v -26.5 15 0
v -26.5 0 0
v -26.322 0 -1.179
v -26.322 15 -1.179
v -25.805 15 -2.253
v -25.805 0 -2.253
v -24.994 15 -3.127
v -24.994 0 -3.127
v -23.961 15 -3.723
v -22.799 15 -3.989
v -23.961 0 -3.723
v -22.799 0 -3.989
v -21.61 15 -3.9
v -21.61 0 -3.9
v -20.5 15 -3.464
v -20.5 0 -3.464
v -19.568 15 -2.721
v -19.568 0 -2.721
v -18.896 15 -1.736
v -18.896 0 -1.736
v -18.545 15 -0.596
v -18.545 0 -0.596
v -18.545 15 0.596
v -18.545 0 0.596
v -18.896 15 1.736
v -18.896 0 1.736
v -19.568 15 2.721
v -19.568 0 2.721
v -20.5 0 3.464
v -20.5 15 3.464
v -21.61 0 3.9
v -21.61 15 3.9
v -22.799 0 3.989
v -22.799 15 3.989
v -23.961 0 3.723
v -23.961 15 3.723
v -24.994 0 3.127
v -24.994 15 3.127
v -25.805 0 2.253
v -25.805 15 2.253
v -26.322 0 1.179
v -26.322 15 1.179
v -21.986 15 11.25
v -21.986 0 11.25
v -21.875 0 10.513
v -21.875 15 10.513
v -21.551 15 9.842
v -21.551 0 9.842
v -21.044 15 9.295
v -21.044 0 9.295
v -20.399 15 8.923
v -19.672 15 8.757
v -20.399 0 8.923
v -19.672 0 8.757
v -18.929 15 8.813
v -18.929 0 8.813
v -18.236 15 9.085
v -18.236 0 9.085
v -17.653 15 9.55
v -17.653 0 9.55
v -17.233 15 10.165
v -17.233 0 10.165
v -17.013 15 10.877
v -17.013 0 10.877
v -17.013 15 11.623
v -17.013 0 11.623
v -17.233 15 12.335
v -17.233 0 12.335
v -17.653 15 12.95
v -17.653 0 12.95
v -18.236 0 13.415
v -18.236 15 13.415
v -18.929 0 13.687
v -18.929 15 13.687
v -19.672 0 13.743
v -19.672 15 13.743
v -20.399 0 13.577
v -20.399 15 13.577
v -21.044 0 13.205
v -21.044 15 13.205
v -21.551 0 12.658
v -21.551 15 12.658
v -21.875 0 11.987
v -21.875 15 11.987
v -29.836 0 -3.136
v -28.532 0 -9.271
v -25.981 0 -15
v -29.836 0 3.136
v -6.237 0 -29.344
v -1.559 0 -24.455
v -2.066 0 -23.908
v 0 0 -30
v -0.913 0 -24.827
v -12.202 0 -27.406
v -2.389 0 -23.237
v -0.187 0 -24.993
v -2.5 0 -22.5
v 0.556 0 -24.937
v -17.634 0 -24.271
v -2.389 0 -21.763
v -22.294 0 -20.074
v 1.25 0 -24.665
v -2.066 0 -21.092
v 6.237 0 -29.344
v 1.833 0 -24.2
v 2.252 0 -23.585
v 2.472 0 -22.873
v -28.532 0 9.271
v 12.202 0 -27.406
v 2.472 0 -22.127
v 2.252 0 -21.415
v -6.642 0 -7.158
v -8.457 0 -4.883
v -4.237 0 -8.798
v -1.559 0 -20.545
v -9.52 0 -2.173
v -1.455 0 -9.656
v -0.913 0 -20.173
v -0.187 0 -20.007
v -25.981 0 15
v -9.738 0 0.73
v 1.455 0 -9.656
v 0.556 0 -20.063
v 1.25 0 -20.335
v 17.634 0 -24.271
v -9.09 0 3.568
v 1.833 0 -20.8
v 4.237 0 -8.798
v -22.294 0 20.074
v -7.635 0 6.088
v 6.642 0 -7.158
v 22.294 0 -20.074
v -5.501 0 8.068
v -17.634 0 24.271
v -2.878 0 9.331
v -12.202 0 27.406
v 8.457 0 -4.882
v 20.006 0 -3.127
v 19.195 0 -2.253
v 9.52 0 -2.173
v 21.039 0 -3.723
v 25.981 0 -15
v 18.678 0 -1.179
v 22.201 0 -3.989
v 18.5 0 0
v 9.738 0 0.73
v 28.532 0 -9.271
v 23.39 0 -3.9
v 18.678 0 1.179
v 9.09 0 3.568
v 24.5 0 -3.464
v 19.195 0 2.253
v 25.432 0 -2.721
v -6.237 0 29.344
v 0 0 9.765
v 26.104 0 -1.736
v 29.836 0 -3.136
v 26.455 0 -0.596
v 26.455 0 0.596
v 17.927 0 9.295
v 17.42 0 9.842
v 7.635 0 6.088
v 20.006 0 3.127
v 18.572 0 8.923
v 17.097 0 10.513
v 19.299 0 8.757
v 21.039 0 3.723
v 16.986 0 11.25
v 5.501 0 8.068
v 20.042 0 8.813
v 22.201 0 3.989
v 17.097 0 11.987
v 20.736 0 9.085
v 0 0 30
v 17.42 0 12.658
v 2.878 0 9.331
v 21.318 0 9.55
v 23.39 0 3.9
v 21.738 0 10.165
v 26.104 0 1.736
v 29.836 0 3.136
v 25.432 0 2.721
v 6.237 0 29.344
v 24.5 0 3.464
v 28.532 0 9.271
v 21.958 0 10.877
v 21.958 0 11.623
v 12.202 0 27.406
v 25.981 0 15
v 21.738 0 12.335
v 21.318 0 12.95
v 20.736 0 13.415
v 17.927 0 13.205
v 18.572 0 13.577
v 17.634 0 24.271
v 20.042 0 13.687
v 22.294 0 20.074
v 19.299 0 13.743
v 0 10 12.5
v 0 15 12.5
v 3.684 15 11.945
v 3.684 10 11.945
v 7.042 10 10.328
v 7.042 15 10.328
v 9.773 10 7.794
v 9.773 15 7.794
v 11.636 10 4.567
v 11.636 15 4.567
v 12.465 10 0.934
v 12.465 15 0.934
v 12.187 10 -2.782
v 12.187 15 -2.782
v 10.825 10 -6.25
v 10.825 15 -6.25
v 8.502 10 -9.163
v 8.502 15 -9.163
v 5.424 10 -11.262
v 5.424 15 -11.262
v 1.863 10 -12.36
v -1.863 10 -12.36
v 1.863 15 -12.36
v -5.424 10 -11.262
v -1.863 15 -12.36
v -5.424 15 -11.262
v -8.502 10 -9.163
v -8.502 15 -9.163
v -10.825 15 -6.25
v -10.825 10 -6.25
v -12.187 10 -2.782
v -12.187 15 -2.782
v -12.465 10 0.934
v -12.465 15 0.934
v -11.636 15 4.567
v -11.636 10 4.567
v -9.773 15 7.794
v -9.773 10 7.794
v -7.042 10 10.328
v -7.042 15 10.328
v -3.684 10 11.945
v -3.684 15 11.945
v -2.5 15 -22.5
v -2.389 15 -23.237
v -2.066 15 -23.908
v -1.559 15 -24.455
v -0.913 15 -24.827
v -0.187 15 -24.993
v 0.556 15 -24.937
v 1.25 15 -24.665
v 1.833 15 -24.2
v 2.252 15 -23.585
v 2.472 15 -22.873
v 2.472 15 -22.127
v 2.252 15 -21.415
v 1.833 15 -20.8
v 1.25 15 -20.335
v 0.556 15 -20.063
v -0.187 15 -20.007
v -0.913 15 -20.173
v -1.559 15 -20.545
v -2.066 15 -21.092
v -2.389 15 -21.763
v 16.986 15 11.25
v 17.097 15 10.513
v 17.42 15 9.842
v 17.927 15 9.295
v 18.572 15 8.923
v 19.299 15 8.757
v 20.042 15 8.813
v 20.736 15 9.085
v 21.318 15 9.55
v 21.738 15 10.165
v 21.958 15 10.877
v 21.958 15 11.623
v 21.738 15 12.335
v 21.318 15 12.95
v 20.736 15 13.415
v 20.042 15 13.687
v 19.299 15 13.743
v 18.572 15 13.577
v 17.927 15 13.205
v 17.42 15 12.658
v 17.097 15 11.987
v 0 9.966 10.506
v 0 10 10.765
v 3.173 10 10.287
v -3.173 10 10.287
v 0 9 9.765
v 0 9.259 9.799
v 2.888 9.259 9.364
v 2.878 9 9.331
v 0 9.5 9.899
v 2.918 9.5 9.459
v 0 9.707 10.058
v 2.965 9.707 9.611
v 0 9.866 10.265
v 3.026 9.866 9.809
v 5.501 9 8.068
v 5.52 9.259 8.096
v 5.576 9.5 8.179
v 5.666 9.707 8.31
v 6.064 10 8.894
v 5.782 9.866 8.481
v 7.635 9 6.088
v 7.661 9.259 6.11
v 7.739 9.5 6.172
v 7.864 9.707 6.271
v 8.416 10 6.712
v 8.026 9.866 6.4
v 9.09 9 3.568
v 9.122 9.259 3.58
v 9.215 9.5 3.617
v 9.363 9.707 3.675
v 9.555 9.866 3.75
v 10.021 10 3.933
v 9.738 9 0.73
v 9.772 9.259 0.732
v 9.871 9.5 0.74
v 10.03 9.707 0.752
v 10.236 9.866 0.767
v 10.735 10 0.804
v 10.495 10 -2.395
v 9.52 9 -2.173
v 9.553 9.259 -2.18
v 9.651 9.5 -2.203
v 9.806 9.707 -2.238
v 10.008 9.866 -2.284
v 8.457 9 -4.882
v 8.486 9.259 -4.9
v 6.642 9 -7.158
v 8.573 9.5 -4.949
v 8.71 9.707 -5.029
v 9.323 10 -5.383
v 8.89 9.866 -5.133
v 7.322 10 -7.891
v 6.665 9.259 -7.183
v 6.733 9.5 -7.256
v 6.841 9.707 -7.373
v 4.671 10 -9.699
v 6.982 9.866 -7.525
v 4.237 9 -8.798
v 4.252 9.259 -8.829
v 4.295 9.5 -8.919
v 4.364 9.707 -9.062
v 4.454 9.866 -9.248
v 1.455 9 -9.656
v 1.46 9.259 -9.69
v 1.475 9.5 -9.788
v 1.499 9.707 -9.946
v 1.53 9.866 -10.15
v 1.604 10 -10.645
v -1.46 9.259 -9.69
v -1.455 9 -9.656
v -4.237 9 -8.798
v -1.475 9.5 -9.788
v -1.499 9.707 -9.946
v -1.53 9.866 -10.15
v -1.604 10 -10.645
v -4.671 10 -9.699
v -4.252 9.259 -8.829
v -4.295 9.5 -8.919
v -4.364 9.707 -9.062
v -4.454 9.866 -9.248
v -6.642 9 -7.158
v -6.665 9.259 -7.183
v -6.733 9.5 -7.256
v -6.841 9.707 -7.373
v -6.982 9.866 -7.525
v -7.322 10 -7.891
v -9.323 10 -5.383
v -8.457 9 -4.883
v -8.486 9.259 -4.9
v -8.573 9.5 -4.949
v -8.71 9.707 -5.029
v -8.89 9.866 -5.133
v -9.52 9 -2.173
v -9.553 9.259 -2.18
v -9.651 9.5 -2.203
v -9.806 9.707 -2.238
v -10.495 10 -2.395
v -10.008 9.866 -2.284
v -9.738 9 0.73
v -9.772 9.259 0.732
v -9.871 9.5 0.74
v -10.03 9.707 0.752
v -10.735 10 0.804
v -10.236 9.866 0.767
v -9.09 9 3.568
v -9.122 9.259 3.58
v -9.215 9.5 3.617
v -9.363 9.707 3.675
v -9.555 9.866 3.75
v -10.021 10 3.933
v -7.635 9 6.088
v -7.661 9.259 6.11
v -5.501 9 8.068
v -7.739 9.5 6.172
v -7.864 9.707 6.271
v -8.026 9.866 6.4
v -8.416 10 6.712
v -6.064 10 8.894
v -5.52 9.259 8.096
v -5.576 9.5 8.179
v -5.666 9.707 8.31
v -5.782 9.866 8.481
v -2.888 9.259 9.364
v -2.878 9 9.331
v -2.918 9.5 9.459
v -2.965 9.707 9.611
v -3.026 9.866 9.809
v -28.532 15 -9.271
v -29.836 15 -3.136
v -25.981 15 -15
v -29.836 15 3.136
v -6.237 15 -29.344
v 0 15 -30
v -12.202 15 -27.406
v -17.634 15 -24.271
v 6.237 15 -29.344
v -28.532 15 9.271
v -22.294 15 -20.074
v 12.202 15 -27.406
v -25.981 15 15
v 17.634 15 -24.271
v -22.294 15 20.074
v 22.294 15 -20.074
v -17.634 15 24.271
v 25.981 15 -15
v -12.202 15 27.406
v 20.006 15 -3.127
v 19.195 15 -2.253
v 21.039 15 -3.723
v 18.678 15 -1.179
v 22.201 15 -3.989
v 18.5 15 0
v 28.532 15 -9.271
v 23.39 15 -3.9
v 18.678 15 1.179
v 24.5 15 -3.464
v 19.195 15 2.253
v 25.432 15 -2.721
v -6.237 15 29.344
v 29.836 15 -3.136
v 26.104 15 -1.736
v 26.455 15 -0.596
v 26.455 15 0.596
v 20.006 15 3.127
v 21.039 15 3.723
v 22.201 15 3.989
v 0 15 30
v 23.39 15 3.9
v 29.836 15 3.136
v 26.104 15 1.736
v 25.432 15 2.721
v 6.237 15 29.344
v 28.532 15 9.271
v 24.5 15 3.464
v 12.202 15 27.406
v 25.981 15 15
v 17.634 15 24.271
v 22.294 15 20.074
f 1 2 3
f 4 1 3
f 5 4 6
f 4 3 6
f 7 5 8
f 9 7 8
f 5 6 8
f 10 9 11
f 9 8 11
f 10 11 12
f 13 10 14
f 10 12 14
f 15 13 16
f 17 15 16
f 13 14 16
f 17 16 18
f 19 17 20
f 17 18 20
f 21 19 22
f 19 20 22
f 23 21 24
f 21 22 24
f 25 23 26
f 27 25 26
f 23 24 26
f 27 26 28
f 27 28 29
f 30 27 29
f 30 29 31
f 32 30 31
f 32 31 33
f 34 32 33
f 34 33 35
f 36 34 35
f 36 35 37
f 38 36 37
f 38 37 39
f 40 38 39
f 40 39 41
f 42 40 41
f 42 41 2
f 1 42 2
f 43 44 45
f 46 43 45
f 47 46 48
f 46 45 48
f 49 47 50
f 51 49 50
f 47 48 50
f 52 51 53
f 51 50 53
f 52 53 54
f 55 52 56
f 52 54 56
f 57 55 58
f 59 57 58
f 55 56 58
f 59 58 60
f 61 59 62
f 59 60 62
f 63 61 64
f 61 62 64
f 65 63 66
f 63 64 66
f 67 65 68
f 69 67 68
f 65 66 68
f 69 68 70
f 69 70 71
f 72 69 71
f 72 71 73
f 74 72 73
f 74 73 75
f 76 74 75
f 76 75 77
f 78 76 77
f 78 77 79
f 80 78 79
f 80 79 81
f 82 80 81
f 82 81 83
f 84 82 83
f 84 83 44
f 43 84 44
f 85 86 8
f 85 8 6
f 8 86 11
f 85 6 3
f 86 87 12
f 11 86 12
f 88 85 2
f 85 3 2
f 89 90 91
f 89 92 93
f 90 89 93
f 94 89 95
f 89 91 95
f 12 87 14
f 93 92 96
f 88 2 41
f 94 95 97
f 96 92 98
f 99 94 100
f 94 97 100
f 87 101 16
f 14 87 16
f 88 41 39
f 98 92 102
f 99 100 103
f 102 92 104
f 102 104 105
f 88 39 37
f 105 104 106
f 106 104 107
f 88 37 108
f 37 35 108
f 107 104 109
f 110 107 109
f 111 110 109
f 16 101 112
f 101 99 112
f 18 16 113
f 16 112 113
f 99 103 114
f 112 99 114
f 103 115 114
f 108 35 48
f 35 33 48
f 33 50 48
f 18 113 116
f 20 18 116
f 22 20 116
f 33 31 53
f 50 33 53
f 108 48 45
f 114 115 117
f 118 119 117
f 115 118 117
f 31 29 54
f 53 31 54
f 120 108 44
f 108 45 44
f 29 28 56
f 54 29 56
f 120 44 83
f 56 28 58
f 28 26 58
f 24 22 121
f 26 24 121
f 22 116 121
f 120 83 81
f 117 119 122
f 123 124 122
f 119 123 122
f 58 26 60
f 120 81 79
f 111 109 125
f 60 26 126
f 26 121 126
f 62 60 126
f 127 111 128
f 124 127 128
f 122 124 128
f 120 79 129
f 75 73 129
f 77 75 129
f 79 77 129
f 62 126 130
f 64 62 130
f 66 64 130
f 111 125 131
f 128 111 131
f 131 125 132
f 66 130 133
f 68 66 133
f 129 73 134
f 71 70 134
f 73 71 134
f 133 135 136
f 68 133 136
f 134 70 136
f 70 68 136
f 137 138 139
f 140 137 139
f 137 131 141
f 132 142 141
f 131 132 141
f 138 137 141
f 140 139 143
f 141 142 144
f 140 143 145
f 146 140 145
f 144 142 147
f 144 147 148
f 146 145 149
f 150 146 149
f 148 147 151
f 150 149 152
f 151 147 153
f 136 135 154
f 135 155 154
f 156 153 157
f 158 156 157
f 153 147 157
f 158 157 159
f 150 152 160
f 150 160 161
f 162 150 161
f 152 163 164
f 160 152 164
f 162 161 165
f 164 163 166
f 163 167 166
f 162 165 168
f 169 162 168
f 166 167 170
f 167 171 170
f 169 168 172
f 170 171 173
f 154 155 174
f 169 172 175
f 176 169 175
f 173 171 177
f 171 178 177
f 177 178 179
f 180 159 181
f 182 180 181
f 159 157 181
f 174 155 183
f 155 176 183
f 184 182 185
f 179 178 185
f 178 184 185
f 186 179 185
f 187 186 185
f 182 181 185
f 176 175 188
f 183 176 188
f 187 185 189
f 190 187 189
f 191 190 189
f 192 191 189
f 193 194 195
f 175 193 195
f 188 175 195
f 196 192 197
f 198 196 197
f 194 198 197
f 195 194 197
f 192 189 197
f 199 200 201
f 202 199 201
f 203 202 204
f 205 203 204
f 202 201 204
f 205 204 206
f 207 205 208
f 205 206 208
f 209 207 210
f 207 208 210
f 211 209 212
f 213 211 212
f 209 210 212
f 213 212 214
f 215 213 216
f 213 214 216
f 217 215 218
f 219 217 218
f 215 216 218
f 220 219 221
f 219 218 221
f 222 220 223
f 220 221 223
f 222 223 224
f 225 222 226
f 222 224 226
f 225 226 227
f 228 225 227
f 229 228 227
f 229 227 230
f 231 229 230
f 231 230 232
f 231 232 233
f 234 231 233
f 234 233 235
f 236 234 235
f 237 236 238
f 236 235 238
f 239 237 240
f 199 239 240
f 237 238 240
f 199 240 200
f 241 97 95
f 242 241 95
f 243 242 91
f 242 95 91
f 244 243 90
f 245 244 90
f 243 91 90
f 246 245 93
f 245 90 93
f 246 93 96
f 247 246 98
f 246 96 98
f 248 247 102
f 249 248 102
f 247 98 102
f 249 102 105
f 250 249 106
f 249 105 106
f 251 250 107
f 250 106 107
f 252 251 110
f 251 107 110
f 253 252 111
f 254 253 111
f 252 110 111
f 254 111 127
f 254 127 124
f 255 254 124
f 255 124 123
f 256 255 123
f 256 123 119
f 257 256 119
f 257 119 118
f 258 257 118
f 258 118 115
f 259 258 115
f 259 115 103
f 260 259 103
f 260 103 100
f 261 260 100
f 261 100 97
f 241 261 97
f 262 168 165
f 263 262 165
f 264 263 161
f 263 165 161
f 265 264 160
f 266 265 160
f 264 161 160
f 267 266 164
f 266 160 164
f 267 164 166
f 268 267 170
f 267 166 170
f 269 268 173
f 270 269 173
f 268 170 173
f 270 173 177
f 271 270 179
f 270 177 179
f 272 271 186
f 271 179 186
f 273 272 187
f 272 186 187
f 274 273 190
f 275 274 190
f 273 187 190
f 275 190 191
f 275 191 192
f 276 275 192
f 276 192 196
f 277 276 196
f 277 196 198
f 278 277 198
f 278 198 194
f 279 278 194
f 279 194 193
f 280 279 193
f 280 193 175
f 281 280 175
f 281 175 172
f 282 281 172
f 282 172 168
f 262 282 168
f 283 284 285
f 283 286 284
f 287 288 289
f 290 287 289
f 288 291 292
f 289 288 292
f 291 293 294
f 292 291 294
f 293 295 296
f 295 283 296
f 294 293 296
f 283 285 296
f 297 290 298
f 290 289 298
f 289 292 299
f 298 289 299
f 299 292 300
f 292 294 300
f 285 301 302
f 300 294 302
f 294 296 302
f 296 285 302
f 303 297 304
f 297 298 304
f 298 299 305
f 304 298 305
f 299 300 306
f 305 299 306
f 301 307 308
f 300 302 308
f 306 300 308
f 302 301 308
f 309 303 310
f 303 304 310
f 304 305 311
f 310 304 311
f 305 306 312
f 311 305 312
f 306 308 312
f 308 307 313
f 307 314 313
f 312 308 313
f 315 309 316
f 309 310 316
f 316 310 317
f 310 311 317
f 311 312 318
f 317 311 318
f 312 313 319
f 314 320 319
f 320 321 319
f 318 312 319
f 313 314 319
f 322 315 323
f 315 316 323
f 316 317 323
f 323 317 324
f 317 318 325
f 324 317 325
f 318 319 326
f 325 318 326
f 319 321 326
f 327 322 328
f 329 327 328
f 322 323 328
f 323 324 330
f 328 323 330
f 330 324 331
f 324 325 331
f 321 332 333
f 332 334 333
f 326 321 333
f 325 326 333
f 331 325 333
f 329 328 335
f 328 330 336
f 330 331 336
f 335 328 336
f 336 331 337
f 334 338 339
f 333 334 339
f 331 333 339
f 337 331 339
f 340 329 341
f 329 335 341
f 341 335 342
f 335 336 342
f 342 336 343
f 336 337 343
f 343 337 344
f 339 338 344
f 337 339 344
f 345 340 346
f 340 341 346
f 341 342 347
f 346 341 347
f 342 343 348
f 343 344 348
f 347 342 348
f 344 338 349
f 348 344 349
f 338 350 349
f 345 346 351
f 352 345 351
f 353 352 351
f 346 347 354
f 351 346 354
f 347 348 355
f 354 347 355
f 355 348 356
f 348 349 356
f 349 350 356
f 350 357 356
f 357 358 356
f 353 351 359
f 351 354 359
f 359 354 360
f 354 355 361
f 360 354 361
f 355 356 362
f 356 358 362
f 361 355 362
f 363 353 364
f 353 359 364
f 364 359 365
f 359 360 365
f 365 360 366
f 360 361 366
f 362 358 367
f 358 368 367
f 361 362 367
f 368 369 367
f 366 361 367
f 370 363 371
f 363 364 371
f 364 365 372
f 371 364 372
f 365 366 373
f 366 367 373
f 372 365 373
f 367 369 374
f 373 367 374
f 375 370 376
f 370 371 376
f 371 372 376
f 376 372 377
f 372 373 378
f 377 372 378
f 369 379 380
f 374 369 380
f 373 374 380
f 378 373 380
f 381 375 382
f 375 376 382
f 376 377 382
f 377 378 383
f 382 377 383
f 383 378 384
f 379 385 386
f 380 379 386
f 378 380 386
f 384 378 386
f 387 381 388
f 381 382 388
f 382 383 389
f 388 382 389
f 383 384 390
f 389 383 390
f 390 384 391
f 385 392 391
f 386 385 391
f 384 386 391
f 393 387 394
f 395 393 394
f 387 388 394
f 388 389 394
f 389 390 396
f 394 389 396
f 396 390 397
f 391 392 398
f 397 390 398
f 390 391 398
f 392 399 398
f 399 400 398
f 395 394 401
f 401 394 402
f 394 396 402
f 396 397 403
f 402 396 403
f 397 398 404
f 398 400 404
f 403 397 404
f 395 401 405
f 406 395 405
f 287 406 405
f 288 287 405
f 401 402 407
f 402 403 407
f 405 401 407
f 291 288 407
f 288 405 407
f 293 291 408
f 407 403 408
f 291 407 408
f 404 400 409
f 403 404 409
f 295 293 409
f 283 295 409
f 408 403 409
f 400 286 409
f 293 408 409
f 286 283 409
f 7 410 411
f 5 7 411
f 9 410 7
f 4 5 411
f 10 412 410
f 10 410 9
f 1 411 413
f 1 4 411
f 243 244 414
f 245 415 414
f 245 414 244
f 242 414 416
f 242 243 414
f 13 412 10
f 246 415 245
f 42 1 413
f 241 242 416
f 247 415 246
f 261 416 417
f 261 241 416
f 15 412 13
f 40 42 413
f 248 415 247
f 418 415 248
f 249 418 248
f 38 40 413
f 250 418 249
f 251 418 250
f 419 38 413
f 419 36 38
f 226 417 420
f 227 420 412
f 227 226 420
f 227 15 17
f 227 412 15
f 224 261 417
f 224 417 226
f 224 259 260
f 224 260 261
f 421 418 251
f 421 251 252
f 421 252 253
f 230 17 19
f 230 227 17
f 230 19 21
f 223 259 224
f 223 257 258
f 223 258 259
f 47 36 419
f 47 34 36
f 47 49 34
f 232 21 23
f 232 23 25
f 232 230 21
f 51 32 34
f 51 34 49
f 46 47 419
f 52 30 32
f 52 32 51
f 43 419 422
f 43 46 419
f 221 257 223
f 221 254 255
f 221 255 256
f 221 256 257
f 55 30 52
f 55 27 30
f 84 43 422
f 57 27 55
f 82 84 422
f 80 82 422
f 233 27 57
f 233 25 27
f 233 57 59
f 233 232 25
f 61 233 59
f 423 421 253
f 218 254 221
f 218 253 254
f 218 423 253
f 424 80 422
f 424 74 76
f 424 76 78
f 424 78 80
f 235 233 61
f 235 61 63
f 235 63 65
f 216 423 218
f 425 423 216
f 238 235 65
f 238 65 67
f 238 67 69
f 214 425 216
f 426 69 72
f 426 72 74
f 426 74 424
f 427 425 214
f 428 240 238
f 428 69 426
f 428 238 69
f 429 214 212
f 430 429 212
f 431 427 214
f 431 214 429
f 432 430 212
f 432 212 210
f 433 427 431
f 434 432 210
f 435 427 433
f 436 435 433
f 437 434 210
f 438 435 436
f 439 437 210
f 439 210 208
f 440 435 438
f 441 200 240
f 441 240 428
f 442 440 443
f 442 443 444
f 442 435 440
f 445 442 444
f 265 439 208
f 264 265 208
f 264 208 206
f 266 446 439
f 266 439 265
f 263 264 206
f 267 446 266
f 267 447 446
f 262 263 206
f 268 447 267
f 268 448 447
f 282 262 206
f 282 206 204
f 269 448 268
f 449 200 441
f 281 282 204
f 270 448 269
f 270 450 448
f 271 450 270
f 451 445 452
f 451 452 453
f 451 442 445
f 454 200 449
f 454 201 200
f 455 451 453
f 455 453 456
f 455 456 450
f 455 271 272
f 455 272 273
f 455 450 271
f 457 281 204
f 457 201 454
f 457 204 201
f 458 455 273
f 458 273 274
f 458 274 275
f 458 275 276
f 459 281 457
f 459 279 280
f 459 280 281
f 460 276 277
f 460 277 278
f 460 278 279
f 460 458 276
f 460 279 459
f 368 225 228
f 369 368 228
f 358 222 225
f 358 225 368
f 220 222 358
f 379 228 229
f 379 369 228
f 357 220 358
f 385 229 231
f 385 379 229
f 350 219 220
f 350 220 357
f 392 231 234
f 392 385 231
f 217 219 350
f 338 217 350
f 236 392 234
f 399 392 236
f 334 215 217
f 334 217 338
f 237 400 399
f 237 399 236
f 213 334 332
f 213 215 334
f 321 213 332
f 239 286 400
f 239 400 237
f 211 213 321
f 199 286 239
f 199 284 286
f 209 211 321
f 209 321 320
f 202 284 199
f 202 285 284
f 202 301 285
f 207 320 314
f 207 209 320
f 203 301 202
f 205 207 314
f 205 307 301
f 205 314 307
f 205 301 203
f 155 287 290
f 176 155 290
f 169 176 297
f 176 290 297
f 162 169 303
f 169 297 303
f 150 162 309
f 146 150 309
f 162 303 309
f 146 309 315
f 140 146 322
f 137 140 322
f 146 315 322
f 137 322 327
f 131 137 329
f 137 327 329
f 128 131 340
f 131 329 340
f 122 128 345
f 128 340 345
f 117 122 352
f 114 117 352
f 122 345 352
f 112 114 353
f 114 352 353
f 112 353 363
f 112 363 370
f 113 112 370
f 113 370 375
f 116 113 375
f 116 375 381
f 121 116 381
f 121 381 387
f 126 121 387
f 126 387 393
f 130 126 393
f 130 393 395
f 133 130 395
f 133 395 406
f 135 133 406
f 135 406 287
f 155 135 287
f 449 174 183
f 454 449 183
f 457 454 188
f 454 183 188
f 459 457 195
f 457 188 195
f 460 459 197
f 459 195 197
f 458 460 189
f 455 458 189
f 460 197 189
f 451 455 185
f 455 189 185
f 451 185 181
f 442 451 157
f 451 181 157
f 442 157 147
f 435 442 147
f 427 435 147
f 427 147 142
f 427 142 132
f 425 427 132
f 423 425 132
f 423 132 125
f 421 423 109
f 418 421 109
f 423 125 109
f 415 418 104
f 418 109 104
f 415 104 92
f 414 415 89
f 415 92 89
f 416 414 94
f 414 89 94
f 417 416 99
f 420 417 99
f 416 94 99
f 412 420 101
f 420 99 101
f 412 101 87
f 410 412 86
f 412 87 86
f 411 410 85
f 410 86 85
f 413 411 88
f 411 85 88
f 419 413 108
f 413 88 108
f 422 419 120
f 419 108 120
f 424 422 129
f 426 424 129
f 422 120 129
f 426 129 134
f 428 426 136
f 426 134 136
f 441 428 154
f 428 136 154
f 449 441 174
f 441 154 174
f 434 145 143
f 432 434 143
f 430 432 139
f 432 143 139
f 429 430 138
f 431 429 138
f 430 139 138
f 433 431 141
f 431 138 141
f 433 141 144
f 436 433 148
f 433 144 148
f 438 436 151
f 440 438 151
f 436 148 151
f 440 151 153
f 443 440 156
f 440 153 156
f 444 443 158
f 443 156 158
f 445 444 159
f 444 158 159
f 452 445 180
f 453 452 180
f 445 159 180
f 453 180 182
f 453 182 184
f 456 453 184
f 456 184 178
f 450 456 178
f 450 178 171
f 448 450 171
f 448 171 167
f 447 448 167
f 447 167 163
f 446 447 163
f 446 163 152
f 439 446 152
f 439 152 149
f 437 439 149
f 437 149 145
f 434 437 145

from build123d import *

# Parameters (mm, degrees)
SKETCH1_R             = 30
BOSS_EXTRUDE1_DEPTH   = 15
CUT_EXTRUDE1_REACH    = 47
SKETCH2_R             = 9.765
SKETCH3_R             = 12.5
CUT_EXTRUDE2_DEPTH    = 5
FILLET1_R             = 1
M6_TAPPED_HOLE1_D     = 5
M6_TAPPED_HOLE1_DEPTH = 17
M6_TAPPED_HOLE1_TIP   = 1.502151548
F_8_0MM_DOWEL_HOLE1_D = 8


with BuildPart() as part:
    # Sketch1 → Boss-Extrude1 (new body)
    with BuildSketch(Plane(origin=(0, 0, 0), x_dir=(1, 0, 0), z_dir=(0, 1, 0))):
        with Locations(Location((0, 0, 0), (0, 0, 270))):
            Circle(SKETCH1_R)
    extrude(amount=BOSS_EXTRUDE1_DEPTH)

    # Sketch2 → Cut-Extrude1 (cut, up to next)
    with BuildSketch(Plane(origin=(0, 15, 0), x_dir=(1, 0, 0), z_dir=(0, 1, 0)), mode=Mode.PRIVATE) as cut_extrude1_sk1:
        with Locations(Location((0, 0, 0), (0, 0, 270))):
            Circle(SKETCH2_R)
    cut_extrude1_tool1 = extrude(cut_extrude1_sk1.sketch, amount=-CUT_EXTRUDE1_REACH, mode=Mode.PRIVATE) & part.part
    add(cut_extrude1_tool1.solids().sort_by_distance((0, 15, 0))[0], mode=Mode.SUBTRACT)

    # Sketch3 → Cut-Extrude2 (cut)
    with BuildSketch(Plane(origin=(0, 15, 0), x_dir=(1, 0, 0), z_dir=(0, 1, 0))):
        with Locations(Location((0, 0, 0), (0, 0, 270))):
            Circle(SKETCH3_R)
    extrude(amount=-CUT_EXTRUDE2_DEPTH, mode=Mode.SUBTRACT)

    # Fillet1
    fillet1_edges = [part.edges().sort_by_distance(p)[0] for p in [
        (0, 10, -9.765),
    ]]
    fillet(fillet1_edges, radius=FILLET1_R)

    # M6 Tapped Hole1
    with Locations(Plane(origin=(0, 15, 0), x_dir=(1, 0, 0), z_dir=(0, 1, 0))):
        with Locations((0, 22.5), (19.485571585, -11.25), (-19.485571585, -11.25)):
            Hole(M6_TAPPED_HOLE1_D / 2, depth=M6_TAPPED_HOLE1_DEPTH)
            with Locations((0, 0, -(M6_TAPPED_HOLE1_DEPTH + M6_TAPPED_HOLE1_TIP / 2))):  # 118° drill point
                Cone(0, M6_TAPPED_HOLE1_D / 2, M6_TAPPED_HOLE1_TIP, mode=Mode.SUBTRACT)

    # Ø8.0mm Dowel Hole1 (through all)
    with Locations(Plane(origin=(0, 15, 0), x_dir=(1, 0, 0), z_dir=(0, 1, 0))):
        with Locations((22.5, 0), (-22.5, 0)):
            Hole(F_8_0MM_DOWEL_HOLE1_D / 2)


solid = part.part
